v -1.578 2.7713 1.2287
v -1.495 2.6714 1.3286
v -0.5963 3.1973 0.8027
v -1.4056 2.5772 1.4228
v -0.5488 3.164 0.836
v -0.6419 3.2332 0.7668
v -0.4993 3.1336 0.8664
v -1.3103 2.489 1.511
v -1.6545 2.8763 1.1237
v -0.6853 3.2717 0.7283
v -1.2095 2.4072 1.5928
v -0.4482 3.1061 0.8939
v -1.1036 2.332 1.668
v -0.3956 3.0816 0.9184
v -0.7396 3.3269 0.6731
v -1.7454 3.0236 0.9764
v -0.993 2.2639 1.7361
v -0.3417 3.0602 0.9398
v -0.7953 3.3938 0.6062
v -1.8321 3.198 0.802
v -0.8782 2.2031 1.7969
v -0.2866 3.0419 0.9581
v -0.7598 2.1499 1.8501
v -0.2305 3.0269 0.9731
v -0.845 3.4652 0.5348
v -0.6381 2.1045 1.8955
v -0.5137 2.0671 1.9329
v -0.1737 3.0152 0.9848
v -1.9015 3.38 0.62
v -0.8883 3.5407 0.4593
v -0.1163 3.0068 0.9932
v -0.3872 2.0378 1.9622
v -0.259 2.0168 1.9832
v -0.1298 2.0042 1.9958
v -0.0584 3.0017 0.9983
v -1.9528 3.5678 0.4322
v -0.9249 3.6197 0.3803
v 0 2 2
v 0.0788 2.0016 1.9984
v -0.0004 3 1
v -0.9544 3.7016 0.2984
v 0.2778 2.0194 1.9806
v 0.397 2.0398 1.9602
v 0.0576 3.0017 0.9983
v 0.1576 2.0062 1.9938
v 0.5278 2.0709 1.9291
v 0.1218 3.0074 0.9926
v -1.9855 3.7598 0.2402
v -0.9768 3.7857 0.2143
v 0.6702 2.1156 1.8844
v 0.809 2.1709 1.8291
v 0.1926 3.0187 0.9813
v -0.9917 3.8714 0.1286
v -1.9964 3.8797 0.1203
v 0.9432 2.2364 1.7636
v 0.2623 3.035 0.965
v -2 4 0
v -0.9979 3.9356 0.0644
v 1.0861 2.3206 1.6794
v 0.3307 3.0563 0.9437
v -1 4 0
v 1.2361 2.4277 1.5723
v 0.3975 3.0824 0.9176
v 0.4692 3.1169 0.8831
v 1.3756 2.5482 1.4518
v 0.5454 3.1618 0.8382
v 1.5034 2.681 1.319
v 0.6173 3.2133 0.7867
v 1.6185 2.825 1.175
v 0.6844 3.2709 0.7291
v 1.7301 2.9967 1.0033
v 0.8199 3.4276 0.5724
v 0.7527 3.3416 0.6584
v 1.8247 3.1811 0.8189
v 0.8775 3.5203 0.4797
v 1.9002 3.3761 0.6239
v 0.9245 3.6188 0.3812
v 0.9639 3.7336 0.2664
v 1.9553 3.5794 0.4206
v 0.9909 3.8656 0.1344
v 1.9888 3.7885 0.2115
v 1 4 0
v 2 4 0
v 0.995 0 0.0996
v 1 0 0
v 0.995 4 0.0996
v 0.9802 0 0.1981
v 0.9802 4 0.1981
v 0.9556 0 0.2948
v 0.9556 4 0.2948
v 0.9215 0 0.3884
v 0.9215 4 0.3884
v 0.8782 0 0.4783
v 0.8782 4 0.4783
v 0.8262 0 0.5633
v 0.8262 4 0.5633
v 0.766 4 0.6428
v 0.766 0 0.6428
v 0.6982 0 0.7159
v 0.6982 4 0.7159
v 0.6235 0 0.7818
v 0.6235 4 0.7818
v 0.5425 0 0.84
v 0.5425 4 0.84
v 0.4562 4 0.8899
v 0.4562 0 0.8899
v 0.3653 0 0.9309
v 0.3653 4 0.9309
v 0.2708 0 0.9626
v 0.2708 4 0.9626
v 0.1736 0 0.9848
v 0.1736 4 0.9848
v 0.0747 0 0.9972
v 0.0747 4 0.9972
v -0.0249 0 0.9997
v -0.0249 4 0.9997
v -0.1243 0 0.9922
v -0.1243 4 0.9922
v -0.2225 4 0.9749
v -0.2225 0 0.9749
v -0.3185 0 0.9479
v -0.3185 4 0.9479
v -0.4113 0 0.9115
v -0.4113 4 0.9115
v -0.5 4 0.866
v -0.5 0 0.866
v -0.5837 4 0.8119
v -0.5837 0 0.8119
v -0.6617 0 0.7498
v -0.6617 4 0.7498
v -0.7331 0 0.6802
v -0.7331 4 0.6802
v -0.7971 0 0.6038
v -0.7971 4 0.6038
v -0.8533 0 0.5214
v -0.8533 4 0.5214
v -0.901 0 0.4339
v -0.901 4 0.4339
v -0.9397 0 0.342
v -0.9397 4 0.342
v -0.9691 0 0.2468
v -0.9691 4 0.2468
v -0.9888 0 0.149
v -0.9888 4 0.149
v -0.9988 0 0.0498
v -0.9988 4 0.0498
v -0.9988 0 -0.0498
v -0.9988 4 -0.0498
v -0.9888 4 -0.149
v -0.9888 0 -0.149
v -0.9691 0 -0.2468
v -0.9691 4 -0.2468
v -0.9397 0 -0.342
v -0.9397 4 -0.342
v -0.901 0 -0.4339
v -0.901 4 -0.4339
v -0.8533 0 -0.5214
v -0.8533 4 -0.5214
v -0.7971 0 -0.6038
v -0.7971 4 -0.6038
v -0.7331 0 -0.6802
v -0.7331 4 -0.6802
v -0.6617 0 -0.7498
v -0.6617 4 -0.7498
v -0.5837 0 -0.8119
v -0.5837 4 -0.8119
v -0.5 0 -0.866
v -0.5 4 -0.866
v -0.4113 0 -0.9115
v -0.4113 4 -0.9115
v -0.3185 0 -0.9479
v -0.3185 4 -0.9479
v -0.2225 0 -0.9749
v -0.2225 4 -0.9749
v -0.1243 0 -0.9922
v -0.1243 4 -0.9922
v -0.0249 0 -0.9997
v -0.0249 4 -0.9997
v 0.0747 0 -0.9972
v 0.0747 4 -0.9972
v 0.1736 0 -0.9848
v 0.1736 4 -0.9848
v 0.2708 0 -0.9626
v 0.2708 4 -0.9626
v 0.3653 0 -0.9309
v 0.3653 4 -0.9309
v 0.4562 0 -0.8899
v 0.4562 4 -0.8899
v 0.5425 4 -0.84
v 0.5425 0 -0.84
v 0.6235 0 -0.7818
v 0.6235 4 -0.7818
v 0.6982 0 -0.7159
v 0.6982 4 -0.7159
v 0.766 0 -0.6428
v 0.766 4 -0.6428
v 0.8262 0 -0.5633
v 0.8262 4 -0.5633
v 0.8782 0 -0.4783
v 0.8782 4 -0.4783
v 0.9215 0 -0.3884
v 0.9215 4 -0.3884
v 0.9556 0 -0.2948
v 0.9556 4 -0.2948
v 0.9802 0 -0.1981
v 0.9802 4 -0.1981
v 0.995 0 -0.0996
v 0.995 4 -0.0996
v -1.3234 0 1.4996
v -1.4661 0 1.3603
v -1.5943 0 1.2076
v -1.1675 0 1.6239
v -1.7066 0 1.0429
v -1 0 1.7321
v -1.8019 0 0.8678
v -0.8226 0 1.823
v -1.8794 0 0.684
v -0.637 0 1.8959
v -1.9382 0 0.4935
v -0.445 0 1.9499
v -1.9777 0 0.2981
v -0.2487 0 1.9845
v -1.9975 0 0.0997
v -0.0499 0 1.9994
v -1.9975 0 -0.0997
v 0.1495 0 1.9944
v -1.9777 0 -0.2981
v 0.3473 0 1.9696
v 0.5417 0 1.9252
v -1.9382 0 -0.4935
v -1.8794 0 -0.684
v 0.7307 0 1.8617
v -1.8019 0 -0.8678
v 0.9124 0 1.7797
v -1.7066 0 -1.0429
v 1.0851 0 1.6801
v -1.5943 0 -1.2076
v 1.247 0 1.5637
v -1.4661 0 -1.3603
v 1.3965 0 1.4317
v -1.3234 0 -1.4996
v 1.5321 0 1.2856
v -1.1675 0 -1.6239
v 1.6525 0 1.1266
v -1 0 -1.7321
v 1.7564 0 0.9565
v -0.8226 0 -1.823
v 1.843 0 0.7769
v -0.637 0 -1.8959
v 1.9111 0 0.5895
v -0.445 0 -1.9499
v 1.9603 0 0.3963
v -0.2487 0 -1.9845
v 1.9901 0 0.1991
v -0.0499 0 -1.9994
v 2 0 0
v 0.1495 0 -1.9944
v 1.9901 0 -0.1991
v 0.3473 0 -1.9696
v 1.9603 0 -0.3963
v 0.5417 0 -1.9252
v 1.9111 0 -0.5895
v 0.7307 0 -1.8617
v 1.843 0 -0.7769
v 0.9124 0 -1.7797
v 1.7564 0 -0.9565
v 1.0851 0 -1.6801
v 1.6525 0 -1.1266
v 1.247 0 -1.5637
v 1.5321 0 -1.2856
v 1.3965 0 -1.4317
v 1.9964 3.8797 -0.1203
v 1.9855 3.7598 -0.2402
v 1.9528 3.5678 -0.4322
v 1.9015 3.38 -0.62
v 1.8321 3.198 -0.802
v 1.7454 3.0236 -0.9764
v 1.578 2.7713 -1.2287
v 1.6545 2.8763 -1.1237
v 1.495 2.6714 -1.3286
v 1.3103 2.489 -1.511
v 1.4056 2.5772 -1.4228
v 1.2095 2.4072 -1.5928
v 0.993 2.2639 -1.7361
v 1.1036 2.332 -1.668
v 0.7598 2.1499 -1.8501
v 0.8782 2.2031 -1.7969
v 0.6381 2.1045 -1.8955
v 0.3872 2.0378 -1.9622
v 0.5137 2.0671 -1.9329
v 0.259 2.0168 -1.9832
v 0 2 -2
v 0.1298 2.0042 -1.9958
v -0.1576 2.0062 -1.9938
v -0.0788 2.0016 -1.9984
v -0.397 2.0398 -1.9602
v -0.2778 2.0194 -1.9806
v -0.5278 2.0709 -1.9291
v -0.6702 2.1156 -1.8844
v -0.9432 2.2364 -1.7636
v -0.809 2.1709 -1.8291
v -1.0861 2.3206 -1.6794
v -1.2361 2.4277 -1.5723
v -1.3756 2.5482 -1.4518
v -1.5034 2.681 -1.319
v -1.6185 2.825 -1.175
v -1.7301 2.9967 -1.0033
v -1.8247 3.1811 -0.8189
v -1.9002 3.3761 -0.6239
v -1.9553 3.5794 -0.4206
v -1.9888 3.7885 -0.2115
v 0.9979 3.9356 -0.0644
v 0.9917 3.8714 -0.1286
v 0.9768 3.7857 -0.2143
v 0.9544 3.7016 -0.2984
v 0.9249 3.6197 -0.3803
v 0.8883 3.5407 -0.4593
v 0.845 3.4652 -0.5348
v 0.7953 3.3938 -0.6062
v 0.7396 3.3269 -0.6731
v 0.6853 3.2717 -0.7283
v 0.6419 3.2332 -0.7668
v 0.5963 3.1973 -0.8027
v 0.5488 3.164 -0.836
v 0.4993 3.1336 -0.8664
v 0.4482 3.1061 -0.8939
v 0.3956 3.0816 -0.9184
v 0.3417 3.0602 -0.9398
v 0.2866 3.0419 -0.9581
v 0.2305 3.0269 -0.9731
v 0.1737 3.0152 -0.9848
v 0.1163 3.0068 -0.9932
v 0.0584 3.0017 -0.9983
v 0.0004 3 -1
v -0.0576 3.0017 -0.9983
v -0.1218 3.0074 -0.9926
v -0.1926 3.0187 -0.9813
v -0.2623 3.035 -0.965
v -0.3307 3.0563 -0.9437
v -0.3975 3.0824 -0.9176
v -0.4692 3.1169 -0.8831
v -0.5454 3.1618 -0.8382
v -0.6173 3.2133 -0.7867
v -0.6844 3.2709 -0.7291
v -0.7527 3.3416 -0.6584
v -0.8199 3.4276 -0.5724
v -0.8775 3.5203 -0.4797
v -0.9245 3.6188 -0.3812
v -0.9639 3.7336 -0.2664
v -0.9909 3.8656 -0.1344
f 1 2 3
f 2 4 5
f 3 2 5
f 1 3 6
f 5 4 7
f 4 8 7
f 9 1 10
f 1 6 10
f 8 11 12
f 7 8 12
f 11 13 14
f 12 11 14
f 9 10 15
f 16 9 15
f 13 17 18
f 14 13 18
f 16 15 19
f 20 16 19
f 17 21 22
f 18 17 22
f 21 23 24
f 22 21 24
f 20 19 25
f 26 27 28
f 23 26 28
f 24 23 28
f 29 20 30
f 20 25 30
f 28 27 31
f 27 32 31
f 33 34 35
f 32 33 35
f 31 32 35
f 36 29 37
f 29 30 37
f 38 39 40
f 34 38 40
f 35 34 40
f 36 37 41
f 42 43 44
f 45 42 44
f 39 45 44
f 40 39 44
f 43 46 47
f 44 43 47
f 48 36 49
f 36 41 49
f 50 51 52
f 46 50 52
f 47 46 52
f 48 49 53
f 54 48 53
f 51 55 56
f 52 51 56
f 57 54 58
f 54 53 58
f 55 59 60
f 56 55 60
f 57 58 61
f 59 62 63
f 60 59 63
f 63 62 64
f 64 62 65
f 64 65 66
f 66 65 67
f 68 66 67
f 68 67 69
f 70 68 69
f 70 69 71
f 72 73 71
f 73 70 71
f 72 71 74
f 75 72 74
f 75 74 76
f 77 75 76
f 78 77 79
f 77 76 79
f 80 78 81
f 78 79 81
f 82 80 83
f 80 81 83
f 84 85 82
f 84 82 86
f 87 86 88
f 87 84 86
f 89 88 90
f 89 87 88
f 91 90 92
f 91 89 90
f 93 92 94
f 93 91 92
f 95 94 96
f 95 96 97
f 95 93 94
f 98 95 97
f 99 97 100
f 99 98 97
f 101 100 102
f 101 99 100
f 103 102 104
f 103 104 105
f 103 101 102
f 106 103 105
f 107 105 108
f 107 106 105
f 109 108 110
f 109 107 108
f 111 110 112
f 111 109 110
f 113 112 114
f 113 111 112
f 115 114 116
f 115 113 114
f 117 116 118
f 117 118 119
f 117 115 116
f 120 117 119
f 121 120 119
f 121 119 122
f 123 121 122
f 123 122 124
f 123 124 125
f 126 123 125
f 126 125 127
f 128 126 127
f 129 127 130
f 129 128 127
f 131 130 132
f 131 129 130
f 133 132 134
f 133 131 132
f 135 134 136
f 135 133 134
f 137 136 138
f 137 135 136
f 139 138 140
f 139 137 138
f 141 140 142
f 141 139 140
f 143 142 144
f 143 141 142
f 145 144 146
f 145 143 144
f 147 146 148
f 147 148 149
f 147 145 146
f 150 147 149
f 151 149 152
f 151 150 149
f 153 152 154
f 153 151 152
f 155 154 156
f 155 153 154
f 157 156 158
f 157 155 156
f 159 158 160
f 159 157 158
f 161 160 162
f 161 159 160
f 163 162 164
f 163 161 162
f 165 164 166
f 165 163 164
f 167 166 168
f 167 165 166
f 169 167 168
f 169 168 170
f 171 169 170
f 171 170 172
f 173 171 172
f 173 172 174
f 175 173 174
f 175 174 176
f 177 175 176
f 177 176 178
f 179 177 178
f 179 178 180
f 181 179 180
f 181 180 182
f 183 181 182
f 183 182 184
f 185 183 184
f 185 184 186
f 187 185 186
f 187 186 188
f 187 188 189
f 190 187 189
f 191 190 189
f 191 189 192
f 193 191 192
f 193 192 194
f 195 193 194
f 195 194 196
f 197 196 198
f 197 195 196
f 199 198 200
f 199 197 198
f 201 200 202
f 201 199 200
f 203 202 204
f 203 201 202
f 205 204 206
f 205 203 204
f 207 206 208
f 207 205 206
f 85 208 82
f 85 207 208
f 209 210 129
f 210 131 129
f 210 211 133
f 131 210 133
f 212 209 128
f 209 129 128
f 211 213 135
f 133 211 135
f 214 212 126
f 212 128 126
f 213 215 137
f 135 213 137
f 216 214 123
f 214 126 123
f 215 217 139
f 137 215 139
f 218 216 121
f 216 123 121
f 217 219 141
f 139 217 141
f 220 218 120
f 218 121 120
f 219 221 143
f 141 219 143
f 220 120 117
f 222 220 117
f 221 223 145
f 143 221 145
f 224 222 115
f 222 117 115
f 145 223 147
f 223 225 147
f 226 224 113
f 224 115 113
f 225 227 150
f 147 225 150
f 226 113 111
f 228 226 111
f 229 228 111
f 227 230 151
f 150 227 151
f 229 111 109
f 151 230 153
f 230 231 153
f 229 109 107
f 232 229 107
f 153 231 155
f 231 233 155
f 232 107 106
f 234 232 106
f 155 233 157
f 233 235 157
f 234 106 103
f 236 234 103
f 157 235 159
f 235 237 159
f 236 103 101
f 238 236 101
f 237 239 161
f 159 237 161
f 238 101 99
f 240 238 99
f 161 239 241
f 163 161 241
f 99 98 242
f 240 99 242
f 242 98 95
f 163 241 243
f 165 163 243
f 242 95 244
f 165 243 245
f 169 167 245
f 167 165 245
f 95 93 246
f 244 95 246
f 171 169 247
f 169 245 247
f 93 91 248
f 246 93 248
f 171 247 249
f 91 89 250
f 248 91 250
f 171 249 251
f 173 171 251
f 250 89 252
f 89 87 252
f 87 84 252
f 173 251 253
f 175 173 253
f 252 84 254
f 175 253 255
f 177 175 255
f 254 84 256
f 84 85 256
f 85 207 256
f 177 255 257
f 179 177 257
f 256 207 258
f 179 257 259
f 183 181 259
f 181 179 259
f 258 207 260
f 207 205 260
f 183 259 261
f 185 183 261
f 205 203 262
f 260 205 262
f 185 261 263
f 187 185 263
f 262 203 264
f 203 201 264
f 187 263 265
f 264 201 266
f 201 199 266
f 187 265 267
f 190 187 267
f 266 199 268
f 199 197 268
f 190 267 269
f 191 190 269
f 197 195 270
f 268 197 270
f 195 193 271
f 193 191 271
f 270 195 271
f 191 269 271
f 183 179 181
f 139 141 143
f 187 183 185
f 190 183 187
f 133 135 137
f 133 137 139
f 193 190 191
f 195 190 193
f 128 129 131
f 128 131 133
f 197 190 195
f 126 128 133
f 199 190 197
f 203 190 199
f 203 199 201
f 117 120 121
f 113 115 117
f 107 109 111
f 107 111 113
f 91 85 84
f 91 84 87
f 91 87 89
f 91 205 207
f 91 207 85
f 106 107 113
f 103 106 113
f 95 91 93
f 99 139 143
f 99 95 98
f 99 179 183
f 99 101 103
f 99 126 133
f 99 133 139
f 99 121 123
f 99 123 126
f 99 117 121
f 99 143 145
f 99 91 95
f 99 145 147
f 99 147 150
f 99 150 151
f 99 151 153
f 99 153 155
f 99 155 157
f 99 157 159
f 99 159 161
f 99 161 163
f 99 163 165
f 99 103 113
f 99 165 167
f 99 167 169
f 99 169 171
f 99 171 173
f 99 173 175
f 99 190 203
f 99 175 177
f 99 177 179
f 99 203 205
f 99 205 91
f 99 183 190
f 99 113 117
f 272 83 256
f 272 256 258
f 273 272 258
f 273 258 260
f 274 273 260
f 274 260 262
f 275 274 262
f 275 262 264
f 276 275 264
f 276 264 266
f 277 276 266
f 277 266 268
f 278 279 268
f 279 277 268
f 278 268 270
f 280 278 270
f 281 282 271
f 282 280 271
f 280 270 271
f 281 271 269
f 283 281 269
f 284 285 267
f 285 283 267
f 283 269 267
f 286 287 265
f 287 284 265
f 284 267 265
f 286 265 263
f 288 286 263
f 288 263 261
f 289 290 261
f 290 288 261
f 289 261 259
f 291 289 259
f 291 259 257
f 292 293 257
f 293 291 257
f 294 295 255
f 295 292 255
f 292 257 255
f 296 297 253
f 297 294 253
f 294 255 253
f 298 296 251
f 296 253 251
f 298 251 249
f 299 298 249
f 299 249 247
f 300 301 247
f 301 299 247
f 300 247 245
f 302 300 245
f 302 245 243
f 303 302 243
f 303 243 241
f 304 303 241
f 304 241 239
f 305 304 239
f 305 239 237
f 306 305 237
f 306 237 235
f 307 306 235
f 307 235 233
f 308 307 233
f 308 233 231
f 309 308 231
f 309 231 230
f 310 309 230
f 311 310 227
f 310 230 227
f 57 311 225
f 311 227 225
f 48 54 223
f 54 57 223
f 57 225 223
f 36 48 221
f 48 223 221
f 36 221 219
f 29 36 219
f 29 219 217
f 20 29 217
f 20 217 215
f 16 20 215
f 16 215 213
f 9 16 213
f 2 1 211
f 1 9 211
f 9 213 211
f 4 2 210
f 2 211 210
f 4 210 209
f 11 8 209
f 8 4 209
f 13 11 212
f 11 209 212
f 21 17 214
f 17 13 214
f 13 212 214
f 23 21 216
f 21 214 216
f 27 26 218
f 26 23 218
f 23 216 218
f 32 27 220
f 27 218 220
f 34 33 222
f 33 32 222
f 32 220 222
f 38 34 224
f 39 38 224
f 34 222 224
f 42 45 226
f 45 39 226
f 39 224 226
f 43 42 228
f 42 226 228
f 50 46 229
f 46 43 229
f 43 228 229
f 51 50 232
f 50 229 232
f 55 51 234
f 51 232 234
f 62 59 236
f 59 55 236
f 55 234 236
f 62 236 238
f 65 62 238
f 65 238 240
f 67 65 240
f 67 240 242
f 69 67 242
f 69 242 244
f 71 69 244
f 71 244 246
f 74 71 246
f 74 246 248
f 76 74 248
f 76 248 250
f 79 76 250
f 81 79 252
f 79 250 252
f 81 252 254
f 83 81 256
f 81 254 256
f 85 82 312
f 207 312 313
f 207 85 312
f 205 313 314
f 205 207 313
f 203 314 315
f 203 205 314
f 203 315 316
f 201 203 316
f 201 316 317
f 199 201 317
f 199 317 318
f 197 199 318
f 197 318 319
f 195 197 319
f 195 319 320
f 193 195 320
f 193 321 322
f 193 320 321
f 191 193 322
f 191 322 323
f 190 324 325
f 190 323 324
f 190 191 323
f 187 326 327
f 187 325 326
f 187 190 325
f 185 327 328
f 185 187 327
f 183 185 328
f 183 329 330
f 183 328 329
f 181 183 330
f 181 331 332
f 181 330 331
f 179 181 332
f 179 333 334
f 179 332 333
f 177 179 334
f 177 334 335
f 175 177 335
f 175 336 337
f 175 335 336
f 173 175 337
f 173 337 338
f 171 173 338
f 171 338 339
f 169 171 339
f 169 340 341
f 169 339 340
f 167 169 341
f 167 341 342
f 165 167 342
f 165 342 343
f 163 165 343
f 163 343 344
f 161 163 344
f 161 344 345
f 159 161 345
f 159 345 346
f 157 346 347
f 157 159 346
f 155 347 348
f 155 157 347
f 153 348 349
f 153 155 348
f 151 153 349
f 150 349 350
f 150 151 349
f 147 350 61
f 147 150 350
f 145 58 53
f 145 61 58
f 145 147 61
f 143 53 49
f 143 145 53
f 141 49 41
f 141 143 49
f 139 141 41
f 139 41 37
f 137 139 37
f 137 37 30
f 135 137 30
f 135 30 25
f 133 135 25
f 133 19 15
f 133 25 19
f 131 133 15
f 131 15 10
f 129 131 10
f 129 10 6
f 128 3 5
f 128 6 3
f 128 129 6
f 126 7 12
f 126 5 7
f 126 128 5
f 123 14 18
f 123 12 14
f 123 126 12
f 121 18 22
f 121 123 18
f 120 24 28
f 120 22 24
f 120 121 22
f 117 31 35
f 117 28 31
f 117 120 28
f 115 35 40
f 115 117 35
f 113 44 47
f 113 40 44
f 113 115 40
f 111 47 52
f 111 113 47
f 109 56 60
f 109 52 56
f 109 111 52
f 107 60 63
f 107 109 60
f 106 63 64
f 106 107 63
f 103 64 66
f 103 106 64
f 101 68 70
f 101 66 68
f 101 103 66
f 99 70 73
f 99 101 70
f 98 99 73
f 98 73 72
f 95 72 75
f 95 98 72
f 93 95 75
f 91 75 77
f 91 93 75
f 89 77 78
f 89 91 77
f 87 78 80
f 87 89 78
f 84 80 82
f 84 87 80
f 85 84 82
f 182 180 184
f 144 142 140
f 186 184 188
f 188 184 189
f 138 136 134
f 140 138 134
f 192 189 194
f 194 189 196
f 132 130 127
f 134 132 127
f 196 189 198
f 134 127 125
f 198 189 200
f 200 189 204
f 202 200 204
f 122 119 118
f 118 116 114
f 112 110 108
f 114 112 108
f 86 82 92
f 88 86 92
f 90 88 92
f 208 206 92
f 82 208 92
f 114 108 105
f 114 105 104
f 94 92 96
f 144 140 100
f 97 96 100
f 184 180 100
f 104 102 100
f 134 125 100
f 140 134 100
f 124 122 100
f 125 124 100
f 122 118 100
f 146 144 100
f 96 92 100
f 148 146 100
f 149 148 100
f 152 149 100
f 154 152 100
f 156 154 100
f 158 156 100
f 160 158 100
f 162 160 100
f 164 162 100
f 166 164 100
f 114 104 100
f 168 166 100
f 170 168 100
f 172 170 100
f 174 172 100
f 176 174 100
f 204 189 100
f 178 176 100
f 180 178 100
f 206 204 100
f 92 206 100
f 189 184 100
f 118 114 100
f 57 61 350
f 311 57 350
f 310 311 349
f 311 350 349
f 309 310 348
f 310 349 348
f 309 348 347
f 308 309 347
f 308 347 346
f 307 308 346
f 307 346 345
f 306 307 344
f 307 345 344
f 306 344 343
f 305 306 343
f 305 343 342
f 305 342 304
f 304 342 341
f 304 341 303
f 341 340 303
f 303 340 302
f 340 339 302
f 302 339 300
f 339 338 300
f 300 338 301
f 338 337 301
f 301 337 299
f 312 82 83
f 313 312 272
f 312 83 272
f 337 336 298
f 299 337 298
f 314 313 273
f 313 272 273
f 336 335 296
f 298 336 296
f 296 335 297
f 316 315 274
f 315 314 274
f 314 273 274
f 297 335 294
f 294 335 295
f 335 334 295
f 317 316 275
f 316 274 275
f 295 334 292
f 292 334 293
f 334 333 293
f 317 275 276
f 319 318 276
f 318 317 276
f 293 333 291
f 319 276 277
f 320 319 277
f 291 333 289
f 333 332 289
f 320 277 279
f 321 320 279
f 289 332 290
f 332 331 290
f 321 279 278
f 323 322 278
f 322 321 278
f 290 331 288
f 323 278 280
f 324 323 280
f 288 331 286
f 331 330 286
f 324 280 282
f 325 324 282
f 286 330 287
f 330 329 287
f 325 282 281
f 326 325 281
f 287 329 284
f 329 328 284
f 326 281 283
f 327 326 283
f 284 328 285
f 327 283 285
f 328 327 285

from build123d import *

# Parameters (mm, degrees)
SKETCH1_R           = 2
SKETCH1_R_2         = 1
BOSS_EXTRUDE1_DEPTH = 4
CUT_EXTRUDE1_DEPTH  = 2
SKETCH3_R           = 1
BOSS_EXTRUDE2_DEPTH = 4


with BuildPart() as part:
    # Sketch1 → Boss-Extrude1 (new body)
    with BuildSketch(Plane(origin=(0, 0, 0), x_dir=(1, 0, 0), z_dir=(0, 1, 0))):
        Circle(SKETCH1_R)
        Circle(SKETCH1_R_2, mode=Mode.SUBTRACT)
    extrude(amount=BOSS_EXTRUDE1_DEPTH)

    # Sketch2 → Cut-Extrude1 (cut, symmetric)
    with BuildSketch(Plane(origin=(0, 0, 0), x_dir=(0, 0, -1), z_dir=(1, 0, 0))):
        Polygon((2, 4), (0, 4), (2, 2), align=None)
        Polygon((-2, 4), (-2, 2), (0, 4), align=None)
    extrude(amount=CUT_EXTRUDE1_DEPTH, both=True, mode=Mode.SUBTRACT)


with BuildPart() as body_2:
    # Sketch3 → Boss-Extrude2 (new body)
    with BuildSketch(Plane.XZ):
        Circle(SKETCH3_R)
    extrude(amount=-BOSS_EXTRUDE2_DEPTH)


solid = Compound([part.part, body_2.part])
